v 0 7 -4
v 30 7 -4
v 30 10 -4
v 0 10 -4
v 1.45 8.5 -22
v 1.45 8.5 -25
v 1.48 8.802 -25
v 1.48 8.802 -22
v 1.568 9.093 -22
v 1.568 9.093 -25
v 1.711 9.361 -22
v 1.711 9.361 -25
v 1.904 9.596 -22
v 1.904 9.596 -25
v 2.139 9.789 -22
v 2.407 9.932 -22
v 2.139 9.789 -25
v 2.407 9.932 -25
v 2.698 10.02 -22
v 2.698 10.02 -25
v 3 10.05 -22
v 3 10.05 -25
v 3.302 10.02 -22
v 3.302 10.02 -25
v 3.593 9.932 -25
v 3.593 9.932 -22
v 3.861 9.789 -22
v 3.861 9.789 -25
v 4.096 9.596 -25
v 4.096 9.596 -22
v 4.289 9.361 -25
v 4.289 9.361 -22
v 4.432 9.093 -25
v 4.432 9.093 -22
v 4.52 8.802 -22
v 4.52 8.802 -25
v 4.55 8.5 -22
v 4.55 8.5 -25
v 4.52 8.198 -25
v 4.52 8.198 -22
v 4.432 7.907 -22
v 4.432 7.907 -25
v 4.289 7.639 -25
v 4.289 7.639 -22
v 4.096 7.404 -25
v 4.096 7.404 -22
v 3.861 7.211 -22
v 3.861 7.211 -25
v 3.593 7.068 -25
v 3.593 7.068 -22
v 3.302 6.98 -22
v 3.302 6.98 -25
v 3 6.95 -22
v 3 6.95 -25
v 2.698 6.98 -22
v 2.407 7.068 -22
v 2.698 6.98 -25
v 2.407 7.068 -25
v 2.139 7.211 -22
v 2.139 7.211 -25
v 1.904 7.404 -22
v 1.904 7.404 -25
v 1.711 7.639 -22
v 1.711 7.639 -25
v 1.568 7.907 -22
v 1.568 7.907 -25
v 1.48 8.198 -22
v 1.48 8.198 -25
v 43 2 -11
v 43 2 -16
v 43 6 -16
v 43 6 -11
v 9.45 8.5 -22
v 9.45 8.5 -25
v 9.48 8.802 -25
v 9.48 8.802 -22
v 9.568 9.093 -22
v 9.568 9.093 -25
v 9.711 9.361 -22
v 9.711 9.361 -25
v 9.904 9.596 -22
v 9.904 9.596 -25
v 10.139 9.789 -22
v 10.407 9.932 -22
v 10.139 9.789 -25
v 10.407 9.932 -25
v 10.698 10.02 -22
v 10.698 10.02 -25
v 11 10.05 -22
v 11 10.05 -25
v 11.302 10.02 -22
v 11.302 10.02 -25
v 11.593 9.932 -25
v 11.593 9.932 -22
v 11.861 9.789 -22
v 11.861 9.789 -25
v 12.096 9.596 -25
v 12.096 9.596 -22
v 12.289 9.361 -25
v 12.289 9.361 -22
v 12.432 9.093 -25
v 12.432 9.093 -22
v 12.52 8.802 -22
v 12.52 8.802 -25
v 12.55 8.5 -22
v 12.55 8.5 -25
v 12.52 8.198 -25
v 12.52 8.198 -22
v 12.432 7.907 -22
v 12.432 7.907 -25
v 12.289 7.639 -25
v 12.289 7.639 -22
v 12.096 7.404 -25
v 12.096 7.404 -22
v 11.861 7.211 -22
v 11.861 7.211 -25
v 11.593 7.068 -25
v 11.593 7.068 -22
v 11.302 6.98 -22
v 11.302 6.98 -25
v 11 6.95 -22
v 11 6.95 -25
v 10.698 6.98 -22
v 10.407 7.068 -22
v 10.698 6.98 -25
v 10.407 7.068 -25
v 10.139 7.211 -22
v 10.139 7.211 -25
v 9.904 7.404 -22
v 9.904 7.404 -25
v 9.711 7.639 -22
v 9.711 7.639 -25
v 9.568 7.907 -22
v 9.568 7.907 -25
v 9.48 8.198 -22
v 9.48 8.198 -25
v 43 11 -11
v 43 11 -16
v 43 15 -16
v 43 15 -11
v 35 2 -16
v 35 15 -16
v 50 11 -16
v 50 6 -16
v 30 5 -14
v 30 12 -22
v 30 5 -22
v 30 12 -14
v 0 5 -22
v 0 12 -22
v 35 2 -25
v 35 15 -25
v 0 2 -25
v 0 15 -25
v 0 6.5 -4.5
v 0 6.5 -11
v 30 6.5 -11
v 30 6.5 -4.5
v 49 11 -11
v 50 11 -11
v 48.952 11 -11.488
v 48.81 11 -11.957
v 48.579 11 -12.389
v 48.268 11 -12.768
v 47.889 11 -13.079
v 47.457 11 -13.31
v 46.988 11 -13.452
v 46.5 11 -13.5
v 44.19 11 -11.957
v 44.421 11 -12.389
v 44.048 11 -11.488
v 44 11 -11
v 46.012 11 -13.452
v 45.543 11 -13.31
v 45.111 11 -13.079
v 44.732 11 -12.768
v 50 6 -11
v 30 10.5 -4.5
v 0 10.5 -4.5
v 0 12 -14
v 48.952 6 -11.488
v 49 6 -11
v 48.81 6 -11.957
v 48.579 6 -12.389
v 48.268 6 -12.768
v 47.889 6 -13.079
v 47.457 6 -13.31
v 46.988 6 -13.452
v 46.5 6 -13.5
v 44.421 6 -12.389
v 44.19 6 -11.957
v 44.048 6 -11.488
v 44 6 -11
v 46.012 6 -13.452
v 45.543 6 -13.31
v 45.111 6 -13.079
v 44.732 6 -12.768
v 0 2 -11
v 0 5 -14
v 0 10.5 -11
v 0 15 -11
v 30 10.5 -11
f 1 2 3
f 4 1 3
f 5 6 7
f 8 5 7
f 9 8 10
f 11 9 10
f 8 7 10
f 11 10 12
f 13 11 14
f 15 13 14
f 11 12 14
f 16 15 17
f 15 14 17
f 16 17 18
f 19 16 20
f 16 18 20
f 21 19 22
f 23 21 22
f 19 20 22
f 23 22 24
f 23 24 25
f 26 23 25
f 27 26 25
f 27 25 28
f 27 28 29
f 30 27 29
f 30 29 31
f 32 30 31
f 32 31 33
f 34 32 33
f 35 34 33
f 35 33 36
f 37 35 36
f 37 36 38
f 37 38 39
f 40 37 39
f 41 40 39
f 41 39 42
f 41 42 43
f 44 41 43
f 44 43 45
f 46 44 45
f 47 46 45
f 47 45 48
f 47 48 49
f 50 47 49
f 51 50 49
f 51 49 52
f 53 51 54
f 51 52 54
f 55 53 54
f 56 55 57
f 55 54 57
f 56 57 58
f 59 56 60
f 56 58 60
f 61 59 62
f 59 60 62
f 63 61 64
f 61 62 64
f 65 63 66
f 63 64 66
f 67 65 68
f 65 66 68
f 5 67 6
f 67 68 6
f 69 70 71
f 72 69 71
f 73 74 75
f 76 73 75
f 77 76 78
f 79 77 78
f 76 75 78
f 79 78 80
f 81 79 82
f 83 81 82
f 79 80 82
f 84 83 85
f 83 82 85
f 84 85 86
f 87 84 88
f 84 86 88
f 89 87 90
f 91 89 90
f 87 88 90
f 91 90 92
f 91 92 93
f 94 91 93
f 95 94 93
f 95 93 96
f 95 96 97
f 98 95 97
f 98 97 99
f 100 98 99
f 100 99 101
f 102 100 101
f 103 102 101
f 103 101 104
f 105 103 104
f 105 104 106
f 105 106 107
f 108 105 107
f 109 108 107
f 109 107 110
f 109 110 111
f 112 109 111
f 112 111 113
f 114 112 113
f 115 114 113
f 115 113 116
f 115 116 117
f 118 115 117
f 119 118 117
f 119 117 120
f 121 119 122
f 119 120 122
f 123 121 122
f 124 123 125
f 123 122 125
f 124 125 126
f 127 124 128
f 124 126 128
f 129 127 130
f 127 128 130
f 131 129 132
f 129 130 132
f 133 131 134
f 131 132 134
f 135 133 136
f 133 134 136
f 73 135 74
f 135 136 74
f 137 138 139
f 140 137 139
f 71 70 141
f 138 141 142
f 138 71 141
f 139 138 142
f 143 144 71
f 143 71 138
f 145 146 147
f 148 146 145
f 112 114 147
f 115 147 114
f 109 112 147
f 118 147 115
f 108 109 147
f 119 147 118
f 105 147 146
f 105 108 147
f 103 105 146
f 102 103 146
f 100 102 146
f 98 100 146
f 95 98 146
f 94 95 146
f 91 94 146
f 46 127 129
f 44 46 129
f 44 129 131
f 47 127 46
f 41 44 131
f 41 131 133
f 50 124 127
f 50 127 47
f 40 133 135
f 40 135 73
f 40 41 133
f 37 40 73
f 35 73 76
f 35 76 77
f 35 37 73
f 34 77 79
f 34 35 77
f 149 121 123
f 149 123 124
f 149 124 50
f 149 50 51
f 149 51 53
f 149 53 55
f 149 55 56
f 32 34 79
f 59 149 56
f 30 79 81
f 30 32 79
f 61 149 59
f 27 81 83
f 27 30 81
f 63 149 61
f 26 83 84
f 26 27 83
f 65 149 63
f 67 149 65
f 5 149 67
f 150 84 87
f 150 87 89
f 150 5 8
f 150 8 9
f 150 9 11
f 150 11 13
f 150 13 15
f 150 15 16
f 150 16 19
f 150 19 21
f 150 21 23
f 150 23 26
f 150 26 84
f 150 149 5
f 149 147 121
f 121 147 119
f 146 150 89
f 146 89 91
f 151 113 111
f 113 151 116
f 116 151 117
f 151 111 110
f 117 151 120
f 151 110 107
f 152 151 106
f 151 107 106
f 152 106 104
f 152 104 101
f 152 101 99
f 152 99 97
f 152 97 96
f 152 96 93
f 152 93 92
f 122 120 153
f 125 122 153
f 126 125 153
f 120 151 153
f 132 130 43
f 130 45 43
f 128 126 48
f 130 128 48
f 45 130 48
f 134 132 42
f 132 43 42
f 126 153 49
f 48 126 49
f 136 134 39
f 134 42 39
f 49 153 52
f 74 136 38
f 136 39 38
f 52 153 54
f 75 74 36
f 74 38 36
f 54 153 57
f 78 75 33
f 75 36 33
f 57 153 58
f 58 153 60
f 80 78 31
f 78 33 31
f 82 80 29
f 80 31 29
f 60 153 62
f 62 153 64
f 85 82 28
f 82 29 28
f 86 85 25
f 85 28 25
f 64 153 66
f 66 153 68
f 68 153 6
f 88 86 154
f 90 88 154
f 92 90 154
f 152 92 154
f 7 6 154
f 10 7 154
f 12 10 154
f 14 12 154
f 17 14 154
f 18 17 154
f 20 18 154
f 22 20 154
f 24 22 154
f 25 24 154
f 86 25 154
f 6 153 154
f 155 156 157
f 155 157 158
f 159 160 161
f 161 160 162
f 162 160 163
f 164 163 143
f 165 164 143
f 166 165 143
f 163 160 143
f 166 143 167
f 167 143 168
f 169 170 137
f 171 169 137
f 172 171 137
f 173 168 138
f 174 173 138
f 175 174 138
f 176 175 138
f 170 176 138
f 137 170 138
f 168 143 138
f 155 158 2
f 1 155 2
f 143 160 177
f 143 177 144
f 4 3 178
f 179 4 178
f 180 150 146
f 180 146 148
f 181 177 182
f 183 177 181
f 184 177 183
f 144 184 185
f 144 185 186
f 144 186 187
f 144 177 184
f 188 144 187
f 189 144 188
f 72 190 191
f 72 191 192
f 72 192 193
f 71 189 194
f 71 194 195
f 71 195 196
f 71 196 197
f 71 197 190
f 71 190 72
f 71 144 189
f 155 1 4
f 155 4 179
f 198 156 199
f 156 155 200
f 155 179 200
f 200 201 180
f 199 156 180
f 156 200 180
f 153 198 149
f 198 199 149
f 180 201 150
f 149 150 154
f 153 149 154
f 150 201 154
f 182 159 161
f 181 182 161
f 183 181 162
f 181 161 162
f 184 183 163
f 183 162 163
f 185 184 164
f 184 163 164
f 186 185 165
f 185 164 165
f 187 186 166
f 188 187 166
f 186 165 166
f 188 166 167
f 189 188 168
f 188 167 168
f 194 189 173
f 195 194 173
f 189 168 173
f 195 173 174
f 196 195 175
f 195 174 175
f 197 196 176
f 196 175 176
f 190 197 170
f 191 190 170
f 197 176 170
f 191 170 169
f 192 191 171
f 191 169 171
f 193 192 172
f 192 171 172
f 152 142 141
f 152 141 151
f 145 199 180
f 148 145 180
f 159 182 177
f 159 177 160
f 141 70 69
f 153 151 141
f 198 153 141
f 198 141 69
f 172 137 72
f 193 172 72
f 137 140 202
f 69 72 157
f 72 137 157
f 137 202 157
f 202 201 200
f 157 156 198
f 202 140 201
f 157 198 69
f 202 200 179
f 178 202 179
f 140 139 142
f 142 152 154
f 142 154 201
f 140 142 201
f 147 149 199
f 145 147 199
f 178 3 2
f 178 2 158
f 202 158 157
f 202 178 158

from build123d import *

# Parameters (mm, degrees)
SKETCH_1_W                      = 25
SKETCH_1_H                      = 17
EXTRUDE_1_DEPTH                 = 50
SKETCH_2_W                      = 11
SKETCH_2_H                      = 6
CUT_EXTRUDE_1_DEPTH             = 50
SKETCH_3_W                      = 20
SKETCH_3_H                      = 11
CUT_EXTRUDE_2_DEPTH             = 50
SKETCH_4_W                      = 7
SKETCH_4_H                      = 6
CUT_EXTRUDE_3_DEPTH             = 50
SKETCH_5_W                      = 7
SKETCH_5_H                      = 9
CUT_EXTRUDE_4_DEPTH             = 50
SKETCH_6_R                      = 2.5
CUT_EXTRUDE_5_DEPTH             = 50
SKETCH_7_W                      = 14
SKETCH_7_H                      = 2
CUT_EXTRUDE_8_DEPTH             = 50
SKETCH_10_W                     = 4
SKETCH_10_H                     = 5
CUT_EXTRUDE_9_DEPTH             = 50
SKETCH_11_W                     = 8
SKETCH_11_H                     = 7
CUT_EXTRUDE_10_DEPTH            = 30
CUT_EXTRUDE_11_DEPTH            = 50
CUT_EXTRUDE_12_DEPTH            = 50
SKETCH_14_R                     = 1.55
CUT_EXTRUDE_13_DEPTH            = 5
SKIZZE1_W                       = 9
SKIZZE1_H                       = 13
SCHNITT_LINEAR_AUSTRAGEN1_DEPTH = 8


with BuildPart() as part:
    # 草图1 → 凸台-拉伸1 (new body)
    with BuildSketch(Plane(origin=(0, 0, 0), x_dir=(0, 0, -1), z_dir=(1, 0, 0))):
        with Locations((12.5, 8.5)):
            Rectangle(SKETCH_1_W, SKETCH_1_H)
    extrude(amount=EXTRUDE_1_DEPTH)

    # 草图2 → 切除-拉伸1 (cut)
    with BuildSketch(Plane.ZY):
        with Locations((-5.5, 14)):
            Rectangle(SKETCH_2_W, SKETCH_2_H)
        with Locations((-5.5, 3)):
            Rectangle(SKETCH_2_W, SKETCH_2_H)
    extrude(amount=-CUT_EXTRUDE_1_DEPTH, mode=Mode.SUBTRACT)

    # 草图3 → 切除-拉伸2 (cut)
    with BuildSketch(Plane(origin=(0, 11, 0), x_dir=(1, 0, 0), z_dir=(0, 1, 0))):
        with Locations((40, 5.5)):
            Rectangle(SKETCH_3_W, SKETCH_3_H)
    extrude(amount=-CUT_EXTRUDE_2_DEPTH, mode=Mode.SUBTRACT)

    # 草图4 → 切除-拉伸3 (cut)
    with BuildSketch(Plane(origin=(0, 0, -25), x_dir=(-1, 0, 0), z_dir=(0, 0, -1))):
        with Locations((-46.5, 14)):
            Rectangle(SKETCH_4_W, SKETCH_4_H)
        with Locations((-46.5, 3)):
            Rectangle(SKETCH_4_W, SKETCH_4_H)
    extrude(amount=-CUT_EXTRUDE_3_DEPTH, mode=Mode.SUBTRACT)

    # 草图5 → 切除-拉伸4 (cut)
    with BuildSketch(Plane(origin=(0, 11, 0), x_dir=(1, 0, 0), z_dir=(0, 1, 0))):
        with Locations((46.5, 20.5)):
            Rectangle(SKETCH_5_W, SKETCH_5_H)
    extrude(amount=-CUT_EXTRUDE_4_DEPTH, mode=Mode.SUBTRACT)

    # 草图6 → 切除-拉伸5 (cut)
    with BuildSketch(Plane(origin=(0, 11, 0), x_dir=(1, 0, 0), z_dir=(0, 1, 0))):
        with Locations((46.5, 11)):
            Circle(SKETCH_6_R)
    extrude(amount=-CUT_EXTRUDE_5_DEPTH, mode=Mode.SUBTRACT)

    # 草图7 → 切除-拉伸8 (cut)
    with BuildSketch(Plane.ZY):
        with Locations((-18, 16)):
            Rectangle(SKETCH_7_W, SKETCH_7_H)
        with Locations((-18, 1)):
            Rectangle(SKETCH_7_W, SKETCH_7_H)
    extrude(amount=-CUT_EXTRUDE_8_DEPTH, mode=Mode.SUBTRACT)

    # 草图10 → 切除-拉伸9 (cut)
    with BuildSketch(Plane.ZY):
        with Locations((-2, 8.5)):
            Rectangle(SKETCH_10_W, SKETCH_10_H)
    extrude(amount=-CUT_EXTRUDE_9_DEPTH, mode=Mode.SUBTRACT)

    # 草图11 → 切除-拉伸10 (cut)
    with BuildSketch(Plane.ZY):
        with Locations((-18, 8.5)):
            Rectangle(SKETCH_11_W, SKETCH_11_H)
    extrude(amount=-CUT_EXTRUDE_10_DEPTH, mode=Mode.SUBTRACT)

    # 草图12 → 切除-拉伸11 (cut)
    with BuildSketch(Plane.ZY):
        Polygon((-4, 11), (-4, 10), (-5, 11), align=None)
        Polygon((-4, 6), (-5, 6), (-4, 7), align=None)
    extrude(amount=-CUT_EXTRUDE_11_DEPTH, mode=Mode.SUBTRACT)

    # 草图13 → 切除-拉伸12 (cut)
    with BuildSketch(Plane.ZY):
        Polygon((-11, 11), (-11, 10.5), (-4.5, 10.5), (-5, 11), align=None)
        Polygon((-4.5, 6.5), (-5, 6), (-11, 6), (-11, 6.5), align=None)
    extrude(amount=-CUT_EXTRUDE_12_DEPTH, mode=Mode.SUBTRACT)

    # 草图14 → 切除-拉伸13 (cut)
    with BuildSketch(Plane(origin=(0, 0, -25), x_dir=(-1, 0, 0), z_dir=(0, 0, -1))):
        with Locations((-3, 8.5)):
            Circle(SKETCH_14_R)
        with Locations((-11, 8.5)):
            Circle(SKETCH_14_R)
    extrude(amount=-CUT_EXTRUDE_13_DEPTH, mode=Mode.SUBTRACT)

    # Skizze1 → Schnitt-Linear austragen1 (cut)
    with BuildSketch(Plane(origin=(43, 0, 0), x_dir=(0, 0, -1), z_dir=(1, 0, 0))):
        with Locations((20.5, 8.5)):
            Rectangle(SKIZZE1_W, SKIZZE1_H)
    extrude(amount=-SCHNITT_LINEAR_AUSTRAGEN1_DEPTH, mode=Mode.SUBTRACT)


solid = part.part
